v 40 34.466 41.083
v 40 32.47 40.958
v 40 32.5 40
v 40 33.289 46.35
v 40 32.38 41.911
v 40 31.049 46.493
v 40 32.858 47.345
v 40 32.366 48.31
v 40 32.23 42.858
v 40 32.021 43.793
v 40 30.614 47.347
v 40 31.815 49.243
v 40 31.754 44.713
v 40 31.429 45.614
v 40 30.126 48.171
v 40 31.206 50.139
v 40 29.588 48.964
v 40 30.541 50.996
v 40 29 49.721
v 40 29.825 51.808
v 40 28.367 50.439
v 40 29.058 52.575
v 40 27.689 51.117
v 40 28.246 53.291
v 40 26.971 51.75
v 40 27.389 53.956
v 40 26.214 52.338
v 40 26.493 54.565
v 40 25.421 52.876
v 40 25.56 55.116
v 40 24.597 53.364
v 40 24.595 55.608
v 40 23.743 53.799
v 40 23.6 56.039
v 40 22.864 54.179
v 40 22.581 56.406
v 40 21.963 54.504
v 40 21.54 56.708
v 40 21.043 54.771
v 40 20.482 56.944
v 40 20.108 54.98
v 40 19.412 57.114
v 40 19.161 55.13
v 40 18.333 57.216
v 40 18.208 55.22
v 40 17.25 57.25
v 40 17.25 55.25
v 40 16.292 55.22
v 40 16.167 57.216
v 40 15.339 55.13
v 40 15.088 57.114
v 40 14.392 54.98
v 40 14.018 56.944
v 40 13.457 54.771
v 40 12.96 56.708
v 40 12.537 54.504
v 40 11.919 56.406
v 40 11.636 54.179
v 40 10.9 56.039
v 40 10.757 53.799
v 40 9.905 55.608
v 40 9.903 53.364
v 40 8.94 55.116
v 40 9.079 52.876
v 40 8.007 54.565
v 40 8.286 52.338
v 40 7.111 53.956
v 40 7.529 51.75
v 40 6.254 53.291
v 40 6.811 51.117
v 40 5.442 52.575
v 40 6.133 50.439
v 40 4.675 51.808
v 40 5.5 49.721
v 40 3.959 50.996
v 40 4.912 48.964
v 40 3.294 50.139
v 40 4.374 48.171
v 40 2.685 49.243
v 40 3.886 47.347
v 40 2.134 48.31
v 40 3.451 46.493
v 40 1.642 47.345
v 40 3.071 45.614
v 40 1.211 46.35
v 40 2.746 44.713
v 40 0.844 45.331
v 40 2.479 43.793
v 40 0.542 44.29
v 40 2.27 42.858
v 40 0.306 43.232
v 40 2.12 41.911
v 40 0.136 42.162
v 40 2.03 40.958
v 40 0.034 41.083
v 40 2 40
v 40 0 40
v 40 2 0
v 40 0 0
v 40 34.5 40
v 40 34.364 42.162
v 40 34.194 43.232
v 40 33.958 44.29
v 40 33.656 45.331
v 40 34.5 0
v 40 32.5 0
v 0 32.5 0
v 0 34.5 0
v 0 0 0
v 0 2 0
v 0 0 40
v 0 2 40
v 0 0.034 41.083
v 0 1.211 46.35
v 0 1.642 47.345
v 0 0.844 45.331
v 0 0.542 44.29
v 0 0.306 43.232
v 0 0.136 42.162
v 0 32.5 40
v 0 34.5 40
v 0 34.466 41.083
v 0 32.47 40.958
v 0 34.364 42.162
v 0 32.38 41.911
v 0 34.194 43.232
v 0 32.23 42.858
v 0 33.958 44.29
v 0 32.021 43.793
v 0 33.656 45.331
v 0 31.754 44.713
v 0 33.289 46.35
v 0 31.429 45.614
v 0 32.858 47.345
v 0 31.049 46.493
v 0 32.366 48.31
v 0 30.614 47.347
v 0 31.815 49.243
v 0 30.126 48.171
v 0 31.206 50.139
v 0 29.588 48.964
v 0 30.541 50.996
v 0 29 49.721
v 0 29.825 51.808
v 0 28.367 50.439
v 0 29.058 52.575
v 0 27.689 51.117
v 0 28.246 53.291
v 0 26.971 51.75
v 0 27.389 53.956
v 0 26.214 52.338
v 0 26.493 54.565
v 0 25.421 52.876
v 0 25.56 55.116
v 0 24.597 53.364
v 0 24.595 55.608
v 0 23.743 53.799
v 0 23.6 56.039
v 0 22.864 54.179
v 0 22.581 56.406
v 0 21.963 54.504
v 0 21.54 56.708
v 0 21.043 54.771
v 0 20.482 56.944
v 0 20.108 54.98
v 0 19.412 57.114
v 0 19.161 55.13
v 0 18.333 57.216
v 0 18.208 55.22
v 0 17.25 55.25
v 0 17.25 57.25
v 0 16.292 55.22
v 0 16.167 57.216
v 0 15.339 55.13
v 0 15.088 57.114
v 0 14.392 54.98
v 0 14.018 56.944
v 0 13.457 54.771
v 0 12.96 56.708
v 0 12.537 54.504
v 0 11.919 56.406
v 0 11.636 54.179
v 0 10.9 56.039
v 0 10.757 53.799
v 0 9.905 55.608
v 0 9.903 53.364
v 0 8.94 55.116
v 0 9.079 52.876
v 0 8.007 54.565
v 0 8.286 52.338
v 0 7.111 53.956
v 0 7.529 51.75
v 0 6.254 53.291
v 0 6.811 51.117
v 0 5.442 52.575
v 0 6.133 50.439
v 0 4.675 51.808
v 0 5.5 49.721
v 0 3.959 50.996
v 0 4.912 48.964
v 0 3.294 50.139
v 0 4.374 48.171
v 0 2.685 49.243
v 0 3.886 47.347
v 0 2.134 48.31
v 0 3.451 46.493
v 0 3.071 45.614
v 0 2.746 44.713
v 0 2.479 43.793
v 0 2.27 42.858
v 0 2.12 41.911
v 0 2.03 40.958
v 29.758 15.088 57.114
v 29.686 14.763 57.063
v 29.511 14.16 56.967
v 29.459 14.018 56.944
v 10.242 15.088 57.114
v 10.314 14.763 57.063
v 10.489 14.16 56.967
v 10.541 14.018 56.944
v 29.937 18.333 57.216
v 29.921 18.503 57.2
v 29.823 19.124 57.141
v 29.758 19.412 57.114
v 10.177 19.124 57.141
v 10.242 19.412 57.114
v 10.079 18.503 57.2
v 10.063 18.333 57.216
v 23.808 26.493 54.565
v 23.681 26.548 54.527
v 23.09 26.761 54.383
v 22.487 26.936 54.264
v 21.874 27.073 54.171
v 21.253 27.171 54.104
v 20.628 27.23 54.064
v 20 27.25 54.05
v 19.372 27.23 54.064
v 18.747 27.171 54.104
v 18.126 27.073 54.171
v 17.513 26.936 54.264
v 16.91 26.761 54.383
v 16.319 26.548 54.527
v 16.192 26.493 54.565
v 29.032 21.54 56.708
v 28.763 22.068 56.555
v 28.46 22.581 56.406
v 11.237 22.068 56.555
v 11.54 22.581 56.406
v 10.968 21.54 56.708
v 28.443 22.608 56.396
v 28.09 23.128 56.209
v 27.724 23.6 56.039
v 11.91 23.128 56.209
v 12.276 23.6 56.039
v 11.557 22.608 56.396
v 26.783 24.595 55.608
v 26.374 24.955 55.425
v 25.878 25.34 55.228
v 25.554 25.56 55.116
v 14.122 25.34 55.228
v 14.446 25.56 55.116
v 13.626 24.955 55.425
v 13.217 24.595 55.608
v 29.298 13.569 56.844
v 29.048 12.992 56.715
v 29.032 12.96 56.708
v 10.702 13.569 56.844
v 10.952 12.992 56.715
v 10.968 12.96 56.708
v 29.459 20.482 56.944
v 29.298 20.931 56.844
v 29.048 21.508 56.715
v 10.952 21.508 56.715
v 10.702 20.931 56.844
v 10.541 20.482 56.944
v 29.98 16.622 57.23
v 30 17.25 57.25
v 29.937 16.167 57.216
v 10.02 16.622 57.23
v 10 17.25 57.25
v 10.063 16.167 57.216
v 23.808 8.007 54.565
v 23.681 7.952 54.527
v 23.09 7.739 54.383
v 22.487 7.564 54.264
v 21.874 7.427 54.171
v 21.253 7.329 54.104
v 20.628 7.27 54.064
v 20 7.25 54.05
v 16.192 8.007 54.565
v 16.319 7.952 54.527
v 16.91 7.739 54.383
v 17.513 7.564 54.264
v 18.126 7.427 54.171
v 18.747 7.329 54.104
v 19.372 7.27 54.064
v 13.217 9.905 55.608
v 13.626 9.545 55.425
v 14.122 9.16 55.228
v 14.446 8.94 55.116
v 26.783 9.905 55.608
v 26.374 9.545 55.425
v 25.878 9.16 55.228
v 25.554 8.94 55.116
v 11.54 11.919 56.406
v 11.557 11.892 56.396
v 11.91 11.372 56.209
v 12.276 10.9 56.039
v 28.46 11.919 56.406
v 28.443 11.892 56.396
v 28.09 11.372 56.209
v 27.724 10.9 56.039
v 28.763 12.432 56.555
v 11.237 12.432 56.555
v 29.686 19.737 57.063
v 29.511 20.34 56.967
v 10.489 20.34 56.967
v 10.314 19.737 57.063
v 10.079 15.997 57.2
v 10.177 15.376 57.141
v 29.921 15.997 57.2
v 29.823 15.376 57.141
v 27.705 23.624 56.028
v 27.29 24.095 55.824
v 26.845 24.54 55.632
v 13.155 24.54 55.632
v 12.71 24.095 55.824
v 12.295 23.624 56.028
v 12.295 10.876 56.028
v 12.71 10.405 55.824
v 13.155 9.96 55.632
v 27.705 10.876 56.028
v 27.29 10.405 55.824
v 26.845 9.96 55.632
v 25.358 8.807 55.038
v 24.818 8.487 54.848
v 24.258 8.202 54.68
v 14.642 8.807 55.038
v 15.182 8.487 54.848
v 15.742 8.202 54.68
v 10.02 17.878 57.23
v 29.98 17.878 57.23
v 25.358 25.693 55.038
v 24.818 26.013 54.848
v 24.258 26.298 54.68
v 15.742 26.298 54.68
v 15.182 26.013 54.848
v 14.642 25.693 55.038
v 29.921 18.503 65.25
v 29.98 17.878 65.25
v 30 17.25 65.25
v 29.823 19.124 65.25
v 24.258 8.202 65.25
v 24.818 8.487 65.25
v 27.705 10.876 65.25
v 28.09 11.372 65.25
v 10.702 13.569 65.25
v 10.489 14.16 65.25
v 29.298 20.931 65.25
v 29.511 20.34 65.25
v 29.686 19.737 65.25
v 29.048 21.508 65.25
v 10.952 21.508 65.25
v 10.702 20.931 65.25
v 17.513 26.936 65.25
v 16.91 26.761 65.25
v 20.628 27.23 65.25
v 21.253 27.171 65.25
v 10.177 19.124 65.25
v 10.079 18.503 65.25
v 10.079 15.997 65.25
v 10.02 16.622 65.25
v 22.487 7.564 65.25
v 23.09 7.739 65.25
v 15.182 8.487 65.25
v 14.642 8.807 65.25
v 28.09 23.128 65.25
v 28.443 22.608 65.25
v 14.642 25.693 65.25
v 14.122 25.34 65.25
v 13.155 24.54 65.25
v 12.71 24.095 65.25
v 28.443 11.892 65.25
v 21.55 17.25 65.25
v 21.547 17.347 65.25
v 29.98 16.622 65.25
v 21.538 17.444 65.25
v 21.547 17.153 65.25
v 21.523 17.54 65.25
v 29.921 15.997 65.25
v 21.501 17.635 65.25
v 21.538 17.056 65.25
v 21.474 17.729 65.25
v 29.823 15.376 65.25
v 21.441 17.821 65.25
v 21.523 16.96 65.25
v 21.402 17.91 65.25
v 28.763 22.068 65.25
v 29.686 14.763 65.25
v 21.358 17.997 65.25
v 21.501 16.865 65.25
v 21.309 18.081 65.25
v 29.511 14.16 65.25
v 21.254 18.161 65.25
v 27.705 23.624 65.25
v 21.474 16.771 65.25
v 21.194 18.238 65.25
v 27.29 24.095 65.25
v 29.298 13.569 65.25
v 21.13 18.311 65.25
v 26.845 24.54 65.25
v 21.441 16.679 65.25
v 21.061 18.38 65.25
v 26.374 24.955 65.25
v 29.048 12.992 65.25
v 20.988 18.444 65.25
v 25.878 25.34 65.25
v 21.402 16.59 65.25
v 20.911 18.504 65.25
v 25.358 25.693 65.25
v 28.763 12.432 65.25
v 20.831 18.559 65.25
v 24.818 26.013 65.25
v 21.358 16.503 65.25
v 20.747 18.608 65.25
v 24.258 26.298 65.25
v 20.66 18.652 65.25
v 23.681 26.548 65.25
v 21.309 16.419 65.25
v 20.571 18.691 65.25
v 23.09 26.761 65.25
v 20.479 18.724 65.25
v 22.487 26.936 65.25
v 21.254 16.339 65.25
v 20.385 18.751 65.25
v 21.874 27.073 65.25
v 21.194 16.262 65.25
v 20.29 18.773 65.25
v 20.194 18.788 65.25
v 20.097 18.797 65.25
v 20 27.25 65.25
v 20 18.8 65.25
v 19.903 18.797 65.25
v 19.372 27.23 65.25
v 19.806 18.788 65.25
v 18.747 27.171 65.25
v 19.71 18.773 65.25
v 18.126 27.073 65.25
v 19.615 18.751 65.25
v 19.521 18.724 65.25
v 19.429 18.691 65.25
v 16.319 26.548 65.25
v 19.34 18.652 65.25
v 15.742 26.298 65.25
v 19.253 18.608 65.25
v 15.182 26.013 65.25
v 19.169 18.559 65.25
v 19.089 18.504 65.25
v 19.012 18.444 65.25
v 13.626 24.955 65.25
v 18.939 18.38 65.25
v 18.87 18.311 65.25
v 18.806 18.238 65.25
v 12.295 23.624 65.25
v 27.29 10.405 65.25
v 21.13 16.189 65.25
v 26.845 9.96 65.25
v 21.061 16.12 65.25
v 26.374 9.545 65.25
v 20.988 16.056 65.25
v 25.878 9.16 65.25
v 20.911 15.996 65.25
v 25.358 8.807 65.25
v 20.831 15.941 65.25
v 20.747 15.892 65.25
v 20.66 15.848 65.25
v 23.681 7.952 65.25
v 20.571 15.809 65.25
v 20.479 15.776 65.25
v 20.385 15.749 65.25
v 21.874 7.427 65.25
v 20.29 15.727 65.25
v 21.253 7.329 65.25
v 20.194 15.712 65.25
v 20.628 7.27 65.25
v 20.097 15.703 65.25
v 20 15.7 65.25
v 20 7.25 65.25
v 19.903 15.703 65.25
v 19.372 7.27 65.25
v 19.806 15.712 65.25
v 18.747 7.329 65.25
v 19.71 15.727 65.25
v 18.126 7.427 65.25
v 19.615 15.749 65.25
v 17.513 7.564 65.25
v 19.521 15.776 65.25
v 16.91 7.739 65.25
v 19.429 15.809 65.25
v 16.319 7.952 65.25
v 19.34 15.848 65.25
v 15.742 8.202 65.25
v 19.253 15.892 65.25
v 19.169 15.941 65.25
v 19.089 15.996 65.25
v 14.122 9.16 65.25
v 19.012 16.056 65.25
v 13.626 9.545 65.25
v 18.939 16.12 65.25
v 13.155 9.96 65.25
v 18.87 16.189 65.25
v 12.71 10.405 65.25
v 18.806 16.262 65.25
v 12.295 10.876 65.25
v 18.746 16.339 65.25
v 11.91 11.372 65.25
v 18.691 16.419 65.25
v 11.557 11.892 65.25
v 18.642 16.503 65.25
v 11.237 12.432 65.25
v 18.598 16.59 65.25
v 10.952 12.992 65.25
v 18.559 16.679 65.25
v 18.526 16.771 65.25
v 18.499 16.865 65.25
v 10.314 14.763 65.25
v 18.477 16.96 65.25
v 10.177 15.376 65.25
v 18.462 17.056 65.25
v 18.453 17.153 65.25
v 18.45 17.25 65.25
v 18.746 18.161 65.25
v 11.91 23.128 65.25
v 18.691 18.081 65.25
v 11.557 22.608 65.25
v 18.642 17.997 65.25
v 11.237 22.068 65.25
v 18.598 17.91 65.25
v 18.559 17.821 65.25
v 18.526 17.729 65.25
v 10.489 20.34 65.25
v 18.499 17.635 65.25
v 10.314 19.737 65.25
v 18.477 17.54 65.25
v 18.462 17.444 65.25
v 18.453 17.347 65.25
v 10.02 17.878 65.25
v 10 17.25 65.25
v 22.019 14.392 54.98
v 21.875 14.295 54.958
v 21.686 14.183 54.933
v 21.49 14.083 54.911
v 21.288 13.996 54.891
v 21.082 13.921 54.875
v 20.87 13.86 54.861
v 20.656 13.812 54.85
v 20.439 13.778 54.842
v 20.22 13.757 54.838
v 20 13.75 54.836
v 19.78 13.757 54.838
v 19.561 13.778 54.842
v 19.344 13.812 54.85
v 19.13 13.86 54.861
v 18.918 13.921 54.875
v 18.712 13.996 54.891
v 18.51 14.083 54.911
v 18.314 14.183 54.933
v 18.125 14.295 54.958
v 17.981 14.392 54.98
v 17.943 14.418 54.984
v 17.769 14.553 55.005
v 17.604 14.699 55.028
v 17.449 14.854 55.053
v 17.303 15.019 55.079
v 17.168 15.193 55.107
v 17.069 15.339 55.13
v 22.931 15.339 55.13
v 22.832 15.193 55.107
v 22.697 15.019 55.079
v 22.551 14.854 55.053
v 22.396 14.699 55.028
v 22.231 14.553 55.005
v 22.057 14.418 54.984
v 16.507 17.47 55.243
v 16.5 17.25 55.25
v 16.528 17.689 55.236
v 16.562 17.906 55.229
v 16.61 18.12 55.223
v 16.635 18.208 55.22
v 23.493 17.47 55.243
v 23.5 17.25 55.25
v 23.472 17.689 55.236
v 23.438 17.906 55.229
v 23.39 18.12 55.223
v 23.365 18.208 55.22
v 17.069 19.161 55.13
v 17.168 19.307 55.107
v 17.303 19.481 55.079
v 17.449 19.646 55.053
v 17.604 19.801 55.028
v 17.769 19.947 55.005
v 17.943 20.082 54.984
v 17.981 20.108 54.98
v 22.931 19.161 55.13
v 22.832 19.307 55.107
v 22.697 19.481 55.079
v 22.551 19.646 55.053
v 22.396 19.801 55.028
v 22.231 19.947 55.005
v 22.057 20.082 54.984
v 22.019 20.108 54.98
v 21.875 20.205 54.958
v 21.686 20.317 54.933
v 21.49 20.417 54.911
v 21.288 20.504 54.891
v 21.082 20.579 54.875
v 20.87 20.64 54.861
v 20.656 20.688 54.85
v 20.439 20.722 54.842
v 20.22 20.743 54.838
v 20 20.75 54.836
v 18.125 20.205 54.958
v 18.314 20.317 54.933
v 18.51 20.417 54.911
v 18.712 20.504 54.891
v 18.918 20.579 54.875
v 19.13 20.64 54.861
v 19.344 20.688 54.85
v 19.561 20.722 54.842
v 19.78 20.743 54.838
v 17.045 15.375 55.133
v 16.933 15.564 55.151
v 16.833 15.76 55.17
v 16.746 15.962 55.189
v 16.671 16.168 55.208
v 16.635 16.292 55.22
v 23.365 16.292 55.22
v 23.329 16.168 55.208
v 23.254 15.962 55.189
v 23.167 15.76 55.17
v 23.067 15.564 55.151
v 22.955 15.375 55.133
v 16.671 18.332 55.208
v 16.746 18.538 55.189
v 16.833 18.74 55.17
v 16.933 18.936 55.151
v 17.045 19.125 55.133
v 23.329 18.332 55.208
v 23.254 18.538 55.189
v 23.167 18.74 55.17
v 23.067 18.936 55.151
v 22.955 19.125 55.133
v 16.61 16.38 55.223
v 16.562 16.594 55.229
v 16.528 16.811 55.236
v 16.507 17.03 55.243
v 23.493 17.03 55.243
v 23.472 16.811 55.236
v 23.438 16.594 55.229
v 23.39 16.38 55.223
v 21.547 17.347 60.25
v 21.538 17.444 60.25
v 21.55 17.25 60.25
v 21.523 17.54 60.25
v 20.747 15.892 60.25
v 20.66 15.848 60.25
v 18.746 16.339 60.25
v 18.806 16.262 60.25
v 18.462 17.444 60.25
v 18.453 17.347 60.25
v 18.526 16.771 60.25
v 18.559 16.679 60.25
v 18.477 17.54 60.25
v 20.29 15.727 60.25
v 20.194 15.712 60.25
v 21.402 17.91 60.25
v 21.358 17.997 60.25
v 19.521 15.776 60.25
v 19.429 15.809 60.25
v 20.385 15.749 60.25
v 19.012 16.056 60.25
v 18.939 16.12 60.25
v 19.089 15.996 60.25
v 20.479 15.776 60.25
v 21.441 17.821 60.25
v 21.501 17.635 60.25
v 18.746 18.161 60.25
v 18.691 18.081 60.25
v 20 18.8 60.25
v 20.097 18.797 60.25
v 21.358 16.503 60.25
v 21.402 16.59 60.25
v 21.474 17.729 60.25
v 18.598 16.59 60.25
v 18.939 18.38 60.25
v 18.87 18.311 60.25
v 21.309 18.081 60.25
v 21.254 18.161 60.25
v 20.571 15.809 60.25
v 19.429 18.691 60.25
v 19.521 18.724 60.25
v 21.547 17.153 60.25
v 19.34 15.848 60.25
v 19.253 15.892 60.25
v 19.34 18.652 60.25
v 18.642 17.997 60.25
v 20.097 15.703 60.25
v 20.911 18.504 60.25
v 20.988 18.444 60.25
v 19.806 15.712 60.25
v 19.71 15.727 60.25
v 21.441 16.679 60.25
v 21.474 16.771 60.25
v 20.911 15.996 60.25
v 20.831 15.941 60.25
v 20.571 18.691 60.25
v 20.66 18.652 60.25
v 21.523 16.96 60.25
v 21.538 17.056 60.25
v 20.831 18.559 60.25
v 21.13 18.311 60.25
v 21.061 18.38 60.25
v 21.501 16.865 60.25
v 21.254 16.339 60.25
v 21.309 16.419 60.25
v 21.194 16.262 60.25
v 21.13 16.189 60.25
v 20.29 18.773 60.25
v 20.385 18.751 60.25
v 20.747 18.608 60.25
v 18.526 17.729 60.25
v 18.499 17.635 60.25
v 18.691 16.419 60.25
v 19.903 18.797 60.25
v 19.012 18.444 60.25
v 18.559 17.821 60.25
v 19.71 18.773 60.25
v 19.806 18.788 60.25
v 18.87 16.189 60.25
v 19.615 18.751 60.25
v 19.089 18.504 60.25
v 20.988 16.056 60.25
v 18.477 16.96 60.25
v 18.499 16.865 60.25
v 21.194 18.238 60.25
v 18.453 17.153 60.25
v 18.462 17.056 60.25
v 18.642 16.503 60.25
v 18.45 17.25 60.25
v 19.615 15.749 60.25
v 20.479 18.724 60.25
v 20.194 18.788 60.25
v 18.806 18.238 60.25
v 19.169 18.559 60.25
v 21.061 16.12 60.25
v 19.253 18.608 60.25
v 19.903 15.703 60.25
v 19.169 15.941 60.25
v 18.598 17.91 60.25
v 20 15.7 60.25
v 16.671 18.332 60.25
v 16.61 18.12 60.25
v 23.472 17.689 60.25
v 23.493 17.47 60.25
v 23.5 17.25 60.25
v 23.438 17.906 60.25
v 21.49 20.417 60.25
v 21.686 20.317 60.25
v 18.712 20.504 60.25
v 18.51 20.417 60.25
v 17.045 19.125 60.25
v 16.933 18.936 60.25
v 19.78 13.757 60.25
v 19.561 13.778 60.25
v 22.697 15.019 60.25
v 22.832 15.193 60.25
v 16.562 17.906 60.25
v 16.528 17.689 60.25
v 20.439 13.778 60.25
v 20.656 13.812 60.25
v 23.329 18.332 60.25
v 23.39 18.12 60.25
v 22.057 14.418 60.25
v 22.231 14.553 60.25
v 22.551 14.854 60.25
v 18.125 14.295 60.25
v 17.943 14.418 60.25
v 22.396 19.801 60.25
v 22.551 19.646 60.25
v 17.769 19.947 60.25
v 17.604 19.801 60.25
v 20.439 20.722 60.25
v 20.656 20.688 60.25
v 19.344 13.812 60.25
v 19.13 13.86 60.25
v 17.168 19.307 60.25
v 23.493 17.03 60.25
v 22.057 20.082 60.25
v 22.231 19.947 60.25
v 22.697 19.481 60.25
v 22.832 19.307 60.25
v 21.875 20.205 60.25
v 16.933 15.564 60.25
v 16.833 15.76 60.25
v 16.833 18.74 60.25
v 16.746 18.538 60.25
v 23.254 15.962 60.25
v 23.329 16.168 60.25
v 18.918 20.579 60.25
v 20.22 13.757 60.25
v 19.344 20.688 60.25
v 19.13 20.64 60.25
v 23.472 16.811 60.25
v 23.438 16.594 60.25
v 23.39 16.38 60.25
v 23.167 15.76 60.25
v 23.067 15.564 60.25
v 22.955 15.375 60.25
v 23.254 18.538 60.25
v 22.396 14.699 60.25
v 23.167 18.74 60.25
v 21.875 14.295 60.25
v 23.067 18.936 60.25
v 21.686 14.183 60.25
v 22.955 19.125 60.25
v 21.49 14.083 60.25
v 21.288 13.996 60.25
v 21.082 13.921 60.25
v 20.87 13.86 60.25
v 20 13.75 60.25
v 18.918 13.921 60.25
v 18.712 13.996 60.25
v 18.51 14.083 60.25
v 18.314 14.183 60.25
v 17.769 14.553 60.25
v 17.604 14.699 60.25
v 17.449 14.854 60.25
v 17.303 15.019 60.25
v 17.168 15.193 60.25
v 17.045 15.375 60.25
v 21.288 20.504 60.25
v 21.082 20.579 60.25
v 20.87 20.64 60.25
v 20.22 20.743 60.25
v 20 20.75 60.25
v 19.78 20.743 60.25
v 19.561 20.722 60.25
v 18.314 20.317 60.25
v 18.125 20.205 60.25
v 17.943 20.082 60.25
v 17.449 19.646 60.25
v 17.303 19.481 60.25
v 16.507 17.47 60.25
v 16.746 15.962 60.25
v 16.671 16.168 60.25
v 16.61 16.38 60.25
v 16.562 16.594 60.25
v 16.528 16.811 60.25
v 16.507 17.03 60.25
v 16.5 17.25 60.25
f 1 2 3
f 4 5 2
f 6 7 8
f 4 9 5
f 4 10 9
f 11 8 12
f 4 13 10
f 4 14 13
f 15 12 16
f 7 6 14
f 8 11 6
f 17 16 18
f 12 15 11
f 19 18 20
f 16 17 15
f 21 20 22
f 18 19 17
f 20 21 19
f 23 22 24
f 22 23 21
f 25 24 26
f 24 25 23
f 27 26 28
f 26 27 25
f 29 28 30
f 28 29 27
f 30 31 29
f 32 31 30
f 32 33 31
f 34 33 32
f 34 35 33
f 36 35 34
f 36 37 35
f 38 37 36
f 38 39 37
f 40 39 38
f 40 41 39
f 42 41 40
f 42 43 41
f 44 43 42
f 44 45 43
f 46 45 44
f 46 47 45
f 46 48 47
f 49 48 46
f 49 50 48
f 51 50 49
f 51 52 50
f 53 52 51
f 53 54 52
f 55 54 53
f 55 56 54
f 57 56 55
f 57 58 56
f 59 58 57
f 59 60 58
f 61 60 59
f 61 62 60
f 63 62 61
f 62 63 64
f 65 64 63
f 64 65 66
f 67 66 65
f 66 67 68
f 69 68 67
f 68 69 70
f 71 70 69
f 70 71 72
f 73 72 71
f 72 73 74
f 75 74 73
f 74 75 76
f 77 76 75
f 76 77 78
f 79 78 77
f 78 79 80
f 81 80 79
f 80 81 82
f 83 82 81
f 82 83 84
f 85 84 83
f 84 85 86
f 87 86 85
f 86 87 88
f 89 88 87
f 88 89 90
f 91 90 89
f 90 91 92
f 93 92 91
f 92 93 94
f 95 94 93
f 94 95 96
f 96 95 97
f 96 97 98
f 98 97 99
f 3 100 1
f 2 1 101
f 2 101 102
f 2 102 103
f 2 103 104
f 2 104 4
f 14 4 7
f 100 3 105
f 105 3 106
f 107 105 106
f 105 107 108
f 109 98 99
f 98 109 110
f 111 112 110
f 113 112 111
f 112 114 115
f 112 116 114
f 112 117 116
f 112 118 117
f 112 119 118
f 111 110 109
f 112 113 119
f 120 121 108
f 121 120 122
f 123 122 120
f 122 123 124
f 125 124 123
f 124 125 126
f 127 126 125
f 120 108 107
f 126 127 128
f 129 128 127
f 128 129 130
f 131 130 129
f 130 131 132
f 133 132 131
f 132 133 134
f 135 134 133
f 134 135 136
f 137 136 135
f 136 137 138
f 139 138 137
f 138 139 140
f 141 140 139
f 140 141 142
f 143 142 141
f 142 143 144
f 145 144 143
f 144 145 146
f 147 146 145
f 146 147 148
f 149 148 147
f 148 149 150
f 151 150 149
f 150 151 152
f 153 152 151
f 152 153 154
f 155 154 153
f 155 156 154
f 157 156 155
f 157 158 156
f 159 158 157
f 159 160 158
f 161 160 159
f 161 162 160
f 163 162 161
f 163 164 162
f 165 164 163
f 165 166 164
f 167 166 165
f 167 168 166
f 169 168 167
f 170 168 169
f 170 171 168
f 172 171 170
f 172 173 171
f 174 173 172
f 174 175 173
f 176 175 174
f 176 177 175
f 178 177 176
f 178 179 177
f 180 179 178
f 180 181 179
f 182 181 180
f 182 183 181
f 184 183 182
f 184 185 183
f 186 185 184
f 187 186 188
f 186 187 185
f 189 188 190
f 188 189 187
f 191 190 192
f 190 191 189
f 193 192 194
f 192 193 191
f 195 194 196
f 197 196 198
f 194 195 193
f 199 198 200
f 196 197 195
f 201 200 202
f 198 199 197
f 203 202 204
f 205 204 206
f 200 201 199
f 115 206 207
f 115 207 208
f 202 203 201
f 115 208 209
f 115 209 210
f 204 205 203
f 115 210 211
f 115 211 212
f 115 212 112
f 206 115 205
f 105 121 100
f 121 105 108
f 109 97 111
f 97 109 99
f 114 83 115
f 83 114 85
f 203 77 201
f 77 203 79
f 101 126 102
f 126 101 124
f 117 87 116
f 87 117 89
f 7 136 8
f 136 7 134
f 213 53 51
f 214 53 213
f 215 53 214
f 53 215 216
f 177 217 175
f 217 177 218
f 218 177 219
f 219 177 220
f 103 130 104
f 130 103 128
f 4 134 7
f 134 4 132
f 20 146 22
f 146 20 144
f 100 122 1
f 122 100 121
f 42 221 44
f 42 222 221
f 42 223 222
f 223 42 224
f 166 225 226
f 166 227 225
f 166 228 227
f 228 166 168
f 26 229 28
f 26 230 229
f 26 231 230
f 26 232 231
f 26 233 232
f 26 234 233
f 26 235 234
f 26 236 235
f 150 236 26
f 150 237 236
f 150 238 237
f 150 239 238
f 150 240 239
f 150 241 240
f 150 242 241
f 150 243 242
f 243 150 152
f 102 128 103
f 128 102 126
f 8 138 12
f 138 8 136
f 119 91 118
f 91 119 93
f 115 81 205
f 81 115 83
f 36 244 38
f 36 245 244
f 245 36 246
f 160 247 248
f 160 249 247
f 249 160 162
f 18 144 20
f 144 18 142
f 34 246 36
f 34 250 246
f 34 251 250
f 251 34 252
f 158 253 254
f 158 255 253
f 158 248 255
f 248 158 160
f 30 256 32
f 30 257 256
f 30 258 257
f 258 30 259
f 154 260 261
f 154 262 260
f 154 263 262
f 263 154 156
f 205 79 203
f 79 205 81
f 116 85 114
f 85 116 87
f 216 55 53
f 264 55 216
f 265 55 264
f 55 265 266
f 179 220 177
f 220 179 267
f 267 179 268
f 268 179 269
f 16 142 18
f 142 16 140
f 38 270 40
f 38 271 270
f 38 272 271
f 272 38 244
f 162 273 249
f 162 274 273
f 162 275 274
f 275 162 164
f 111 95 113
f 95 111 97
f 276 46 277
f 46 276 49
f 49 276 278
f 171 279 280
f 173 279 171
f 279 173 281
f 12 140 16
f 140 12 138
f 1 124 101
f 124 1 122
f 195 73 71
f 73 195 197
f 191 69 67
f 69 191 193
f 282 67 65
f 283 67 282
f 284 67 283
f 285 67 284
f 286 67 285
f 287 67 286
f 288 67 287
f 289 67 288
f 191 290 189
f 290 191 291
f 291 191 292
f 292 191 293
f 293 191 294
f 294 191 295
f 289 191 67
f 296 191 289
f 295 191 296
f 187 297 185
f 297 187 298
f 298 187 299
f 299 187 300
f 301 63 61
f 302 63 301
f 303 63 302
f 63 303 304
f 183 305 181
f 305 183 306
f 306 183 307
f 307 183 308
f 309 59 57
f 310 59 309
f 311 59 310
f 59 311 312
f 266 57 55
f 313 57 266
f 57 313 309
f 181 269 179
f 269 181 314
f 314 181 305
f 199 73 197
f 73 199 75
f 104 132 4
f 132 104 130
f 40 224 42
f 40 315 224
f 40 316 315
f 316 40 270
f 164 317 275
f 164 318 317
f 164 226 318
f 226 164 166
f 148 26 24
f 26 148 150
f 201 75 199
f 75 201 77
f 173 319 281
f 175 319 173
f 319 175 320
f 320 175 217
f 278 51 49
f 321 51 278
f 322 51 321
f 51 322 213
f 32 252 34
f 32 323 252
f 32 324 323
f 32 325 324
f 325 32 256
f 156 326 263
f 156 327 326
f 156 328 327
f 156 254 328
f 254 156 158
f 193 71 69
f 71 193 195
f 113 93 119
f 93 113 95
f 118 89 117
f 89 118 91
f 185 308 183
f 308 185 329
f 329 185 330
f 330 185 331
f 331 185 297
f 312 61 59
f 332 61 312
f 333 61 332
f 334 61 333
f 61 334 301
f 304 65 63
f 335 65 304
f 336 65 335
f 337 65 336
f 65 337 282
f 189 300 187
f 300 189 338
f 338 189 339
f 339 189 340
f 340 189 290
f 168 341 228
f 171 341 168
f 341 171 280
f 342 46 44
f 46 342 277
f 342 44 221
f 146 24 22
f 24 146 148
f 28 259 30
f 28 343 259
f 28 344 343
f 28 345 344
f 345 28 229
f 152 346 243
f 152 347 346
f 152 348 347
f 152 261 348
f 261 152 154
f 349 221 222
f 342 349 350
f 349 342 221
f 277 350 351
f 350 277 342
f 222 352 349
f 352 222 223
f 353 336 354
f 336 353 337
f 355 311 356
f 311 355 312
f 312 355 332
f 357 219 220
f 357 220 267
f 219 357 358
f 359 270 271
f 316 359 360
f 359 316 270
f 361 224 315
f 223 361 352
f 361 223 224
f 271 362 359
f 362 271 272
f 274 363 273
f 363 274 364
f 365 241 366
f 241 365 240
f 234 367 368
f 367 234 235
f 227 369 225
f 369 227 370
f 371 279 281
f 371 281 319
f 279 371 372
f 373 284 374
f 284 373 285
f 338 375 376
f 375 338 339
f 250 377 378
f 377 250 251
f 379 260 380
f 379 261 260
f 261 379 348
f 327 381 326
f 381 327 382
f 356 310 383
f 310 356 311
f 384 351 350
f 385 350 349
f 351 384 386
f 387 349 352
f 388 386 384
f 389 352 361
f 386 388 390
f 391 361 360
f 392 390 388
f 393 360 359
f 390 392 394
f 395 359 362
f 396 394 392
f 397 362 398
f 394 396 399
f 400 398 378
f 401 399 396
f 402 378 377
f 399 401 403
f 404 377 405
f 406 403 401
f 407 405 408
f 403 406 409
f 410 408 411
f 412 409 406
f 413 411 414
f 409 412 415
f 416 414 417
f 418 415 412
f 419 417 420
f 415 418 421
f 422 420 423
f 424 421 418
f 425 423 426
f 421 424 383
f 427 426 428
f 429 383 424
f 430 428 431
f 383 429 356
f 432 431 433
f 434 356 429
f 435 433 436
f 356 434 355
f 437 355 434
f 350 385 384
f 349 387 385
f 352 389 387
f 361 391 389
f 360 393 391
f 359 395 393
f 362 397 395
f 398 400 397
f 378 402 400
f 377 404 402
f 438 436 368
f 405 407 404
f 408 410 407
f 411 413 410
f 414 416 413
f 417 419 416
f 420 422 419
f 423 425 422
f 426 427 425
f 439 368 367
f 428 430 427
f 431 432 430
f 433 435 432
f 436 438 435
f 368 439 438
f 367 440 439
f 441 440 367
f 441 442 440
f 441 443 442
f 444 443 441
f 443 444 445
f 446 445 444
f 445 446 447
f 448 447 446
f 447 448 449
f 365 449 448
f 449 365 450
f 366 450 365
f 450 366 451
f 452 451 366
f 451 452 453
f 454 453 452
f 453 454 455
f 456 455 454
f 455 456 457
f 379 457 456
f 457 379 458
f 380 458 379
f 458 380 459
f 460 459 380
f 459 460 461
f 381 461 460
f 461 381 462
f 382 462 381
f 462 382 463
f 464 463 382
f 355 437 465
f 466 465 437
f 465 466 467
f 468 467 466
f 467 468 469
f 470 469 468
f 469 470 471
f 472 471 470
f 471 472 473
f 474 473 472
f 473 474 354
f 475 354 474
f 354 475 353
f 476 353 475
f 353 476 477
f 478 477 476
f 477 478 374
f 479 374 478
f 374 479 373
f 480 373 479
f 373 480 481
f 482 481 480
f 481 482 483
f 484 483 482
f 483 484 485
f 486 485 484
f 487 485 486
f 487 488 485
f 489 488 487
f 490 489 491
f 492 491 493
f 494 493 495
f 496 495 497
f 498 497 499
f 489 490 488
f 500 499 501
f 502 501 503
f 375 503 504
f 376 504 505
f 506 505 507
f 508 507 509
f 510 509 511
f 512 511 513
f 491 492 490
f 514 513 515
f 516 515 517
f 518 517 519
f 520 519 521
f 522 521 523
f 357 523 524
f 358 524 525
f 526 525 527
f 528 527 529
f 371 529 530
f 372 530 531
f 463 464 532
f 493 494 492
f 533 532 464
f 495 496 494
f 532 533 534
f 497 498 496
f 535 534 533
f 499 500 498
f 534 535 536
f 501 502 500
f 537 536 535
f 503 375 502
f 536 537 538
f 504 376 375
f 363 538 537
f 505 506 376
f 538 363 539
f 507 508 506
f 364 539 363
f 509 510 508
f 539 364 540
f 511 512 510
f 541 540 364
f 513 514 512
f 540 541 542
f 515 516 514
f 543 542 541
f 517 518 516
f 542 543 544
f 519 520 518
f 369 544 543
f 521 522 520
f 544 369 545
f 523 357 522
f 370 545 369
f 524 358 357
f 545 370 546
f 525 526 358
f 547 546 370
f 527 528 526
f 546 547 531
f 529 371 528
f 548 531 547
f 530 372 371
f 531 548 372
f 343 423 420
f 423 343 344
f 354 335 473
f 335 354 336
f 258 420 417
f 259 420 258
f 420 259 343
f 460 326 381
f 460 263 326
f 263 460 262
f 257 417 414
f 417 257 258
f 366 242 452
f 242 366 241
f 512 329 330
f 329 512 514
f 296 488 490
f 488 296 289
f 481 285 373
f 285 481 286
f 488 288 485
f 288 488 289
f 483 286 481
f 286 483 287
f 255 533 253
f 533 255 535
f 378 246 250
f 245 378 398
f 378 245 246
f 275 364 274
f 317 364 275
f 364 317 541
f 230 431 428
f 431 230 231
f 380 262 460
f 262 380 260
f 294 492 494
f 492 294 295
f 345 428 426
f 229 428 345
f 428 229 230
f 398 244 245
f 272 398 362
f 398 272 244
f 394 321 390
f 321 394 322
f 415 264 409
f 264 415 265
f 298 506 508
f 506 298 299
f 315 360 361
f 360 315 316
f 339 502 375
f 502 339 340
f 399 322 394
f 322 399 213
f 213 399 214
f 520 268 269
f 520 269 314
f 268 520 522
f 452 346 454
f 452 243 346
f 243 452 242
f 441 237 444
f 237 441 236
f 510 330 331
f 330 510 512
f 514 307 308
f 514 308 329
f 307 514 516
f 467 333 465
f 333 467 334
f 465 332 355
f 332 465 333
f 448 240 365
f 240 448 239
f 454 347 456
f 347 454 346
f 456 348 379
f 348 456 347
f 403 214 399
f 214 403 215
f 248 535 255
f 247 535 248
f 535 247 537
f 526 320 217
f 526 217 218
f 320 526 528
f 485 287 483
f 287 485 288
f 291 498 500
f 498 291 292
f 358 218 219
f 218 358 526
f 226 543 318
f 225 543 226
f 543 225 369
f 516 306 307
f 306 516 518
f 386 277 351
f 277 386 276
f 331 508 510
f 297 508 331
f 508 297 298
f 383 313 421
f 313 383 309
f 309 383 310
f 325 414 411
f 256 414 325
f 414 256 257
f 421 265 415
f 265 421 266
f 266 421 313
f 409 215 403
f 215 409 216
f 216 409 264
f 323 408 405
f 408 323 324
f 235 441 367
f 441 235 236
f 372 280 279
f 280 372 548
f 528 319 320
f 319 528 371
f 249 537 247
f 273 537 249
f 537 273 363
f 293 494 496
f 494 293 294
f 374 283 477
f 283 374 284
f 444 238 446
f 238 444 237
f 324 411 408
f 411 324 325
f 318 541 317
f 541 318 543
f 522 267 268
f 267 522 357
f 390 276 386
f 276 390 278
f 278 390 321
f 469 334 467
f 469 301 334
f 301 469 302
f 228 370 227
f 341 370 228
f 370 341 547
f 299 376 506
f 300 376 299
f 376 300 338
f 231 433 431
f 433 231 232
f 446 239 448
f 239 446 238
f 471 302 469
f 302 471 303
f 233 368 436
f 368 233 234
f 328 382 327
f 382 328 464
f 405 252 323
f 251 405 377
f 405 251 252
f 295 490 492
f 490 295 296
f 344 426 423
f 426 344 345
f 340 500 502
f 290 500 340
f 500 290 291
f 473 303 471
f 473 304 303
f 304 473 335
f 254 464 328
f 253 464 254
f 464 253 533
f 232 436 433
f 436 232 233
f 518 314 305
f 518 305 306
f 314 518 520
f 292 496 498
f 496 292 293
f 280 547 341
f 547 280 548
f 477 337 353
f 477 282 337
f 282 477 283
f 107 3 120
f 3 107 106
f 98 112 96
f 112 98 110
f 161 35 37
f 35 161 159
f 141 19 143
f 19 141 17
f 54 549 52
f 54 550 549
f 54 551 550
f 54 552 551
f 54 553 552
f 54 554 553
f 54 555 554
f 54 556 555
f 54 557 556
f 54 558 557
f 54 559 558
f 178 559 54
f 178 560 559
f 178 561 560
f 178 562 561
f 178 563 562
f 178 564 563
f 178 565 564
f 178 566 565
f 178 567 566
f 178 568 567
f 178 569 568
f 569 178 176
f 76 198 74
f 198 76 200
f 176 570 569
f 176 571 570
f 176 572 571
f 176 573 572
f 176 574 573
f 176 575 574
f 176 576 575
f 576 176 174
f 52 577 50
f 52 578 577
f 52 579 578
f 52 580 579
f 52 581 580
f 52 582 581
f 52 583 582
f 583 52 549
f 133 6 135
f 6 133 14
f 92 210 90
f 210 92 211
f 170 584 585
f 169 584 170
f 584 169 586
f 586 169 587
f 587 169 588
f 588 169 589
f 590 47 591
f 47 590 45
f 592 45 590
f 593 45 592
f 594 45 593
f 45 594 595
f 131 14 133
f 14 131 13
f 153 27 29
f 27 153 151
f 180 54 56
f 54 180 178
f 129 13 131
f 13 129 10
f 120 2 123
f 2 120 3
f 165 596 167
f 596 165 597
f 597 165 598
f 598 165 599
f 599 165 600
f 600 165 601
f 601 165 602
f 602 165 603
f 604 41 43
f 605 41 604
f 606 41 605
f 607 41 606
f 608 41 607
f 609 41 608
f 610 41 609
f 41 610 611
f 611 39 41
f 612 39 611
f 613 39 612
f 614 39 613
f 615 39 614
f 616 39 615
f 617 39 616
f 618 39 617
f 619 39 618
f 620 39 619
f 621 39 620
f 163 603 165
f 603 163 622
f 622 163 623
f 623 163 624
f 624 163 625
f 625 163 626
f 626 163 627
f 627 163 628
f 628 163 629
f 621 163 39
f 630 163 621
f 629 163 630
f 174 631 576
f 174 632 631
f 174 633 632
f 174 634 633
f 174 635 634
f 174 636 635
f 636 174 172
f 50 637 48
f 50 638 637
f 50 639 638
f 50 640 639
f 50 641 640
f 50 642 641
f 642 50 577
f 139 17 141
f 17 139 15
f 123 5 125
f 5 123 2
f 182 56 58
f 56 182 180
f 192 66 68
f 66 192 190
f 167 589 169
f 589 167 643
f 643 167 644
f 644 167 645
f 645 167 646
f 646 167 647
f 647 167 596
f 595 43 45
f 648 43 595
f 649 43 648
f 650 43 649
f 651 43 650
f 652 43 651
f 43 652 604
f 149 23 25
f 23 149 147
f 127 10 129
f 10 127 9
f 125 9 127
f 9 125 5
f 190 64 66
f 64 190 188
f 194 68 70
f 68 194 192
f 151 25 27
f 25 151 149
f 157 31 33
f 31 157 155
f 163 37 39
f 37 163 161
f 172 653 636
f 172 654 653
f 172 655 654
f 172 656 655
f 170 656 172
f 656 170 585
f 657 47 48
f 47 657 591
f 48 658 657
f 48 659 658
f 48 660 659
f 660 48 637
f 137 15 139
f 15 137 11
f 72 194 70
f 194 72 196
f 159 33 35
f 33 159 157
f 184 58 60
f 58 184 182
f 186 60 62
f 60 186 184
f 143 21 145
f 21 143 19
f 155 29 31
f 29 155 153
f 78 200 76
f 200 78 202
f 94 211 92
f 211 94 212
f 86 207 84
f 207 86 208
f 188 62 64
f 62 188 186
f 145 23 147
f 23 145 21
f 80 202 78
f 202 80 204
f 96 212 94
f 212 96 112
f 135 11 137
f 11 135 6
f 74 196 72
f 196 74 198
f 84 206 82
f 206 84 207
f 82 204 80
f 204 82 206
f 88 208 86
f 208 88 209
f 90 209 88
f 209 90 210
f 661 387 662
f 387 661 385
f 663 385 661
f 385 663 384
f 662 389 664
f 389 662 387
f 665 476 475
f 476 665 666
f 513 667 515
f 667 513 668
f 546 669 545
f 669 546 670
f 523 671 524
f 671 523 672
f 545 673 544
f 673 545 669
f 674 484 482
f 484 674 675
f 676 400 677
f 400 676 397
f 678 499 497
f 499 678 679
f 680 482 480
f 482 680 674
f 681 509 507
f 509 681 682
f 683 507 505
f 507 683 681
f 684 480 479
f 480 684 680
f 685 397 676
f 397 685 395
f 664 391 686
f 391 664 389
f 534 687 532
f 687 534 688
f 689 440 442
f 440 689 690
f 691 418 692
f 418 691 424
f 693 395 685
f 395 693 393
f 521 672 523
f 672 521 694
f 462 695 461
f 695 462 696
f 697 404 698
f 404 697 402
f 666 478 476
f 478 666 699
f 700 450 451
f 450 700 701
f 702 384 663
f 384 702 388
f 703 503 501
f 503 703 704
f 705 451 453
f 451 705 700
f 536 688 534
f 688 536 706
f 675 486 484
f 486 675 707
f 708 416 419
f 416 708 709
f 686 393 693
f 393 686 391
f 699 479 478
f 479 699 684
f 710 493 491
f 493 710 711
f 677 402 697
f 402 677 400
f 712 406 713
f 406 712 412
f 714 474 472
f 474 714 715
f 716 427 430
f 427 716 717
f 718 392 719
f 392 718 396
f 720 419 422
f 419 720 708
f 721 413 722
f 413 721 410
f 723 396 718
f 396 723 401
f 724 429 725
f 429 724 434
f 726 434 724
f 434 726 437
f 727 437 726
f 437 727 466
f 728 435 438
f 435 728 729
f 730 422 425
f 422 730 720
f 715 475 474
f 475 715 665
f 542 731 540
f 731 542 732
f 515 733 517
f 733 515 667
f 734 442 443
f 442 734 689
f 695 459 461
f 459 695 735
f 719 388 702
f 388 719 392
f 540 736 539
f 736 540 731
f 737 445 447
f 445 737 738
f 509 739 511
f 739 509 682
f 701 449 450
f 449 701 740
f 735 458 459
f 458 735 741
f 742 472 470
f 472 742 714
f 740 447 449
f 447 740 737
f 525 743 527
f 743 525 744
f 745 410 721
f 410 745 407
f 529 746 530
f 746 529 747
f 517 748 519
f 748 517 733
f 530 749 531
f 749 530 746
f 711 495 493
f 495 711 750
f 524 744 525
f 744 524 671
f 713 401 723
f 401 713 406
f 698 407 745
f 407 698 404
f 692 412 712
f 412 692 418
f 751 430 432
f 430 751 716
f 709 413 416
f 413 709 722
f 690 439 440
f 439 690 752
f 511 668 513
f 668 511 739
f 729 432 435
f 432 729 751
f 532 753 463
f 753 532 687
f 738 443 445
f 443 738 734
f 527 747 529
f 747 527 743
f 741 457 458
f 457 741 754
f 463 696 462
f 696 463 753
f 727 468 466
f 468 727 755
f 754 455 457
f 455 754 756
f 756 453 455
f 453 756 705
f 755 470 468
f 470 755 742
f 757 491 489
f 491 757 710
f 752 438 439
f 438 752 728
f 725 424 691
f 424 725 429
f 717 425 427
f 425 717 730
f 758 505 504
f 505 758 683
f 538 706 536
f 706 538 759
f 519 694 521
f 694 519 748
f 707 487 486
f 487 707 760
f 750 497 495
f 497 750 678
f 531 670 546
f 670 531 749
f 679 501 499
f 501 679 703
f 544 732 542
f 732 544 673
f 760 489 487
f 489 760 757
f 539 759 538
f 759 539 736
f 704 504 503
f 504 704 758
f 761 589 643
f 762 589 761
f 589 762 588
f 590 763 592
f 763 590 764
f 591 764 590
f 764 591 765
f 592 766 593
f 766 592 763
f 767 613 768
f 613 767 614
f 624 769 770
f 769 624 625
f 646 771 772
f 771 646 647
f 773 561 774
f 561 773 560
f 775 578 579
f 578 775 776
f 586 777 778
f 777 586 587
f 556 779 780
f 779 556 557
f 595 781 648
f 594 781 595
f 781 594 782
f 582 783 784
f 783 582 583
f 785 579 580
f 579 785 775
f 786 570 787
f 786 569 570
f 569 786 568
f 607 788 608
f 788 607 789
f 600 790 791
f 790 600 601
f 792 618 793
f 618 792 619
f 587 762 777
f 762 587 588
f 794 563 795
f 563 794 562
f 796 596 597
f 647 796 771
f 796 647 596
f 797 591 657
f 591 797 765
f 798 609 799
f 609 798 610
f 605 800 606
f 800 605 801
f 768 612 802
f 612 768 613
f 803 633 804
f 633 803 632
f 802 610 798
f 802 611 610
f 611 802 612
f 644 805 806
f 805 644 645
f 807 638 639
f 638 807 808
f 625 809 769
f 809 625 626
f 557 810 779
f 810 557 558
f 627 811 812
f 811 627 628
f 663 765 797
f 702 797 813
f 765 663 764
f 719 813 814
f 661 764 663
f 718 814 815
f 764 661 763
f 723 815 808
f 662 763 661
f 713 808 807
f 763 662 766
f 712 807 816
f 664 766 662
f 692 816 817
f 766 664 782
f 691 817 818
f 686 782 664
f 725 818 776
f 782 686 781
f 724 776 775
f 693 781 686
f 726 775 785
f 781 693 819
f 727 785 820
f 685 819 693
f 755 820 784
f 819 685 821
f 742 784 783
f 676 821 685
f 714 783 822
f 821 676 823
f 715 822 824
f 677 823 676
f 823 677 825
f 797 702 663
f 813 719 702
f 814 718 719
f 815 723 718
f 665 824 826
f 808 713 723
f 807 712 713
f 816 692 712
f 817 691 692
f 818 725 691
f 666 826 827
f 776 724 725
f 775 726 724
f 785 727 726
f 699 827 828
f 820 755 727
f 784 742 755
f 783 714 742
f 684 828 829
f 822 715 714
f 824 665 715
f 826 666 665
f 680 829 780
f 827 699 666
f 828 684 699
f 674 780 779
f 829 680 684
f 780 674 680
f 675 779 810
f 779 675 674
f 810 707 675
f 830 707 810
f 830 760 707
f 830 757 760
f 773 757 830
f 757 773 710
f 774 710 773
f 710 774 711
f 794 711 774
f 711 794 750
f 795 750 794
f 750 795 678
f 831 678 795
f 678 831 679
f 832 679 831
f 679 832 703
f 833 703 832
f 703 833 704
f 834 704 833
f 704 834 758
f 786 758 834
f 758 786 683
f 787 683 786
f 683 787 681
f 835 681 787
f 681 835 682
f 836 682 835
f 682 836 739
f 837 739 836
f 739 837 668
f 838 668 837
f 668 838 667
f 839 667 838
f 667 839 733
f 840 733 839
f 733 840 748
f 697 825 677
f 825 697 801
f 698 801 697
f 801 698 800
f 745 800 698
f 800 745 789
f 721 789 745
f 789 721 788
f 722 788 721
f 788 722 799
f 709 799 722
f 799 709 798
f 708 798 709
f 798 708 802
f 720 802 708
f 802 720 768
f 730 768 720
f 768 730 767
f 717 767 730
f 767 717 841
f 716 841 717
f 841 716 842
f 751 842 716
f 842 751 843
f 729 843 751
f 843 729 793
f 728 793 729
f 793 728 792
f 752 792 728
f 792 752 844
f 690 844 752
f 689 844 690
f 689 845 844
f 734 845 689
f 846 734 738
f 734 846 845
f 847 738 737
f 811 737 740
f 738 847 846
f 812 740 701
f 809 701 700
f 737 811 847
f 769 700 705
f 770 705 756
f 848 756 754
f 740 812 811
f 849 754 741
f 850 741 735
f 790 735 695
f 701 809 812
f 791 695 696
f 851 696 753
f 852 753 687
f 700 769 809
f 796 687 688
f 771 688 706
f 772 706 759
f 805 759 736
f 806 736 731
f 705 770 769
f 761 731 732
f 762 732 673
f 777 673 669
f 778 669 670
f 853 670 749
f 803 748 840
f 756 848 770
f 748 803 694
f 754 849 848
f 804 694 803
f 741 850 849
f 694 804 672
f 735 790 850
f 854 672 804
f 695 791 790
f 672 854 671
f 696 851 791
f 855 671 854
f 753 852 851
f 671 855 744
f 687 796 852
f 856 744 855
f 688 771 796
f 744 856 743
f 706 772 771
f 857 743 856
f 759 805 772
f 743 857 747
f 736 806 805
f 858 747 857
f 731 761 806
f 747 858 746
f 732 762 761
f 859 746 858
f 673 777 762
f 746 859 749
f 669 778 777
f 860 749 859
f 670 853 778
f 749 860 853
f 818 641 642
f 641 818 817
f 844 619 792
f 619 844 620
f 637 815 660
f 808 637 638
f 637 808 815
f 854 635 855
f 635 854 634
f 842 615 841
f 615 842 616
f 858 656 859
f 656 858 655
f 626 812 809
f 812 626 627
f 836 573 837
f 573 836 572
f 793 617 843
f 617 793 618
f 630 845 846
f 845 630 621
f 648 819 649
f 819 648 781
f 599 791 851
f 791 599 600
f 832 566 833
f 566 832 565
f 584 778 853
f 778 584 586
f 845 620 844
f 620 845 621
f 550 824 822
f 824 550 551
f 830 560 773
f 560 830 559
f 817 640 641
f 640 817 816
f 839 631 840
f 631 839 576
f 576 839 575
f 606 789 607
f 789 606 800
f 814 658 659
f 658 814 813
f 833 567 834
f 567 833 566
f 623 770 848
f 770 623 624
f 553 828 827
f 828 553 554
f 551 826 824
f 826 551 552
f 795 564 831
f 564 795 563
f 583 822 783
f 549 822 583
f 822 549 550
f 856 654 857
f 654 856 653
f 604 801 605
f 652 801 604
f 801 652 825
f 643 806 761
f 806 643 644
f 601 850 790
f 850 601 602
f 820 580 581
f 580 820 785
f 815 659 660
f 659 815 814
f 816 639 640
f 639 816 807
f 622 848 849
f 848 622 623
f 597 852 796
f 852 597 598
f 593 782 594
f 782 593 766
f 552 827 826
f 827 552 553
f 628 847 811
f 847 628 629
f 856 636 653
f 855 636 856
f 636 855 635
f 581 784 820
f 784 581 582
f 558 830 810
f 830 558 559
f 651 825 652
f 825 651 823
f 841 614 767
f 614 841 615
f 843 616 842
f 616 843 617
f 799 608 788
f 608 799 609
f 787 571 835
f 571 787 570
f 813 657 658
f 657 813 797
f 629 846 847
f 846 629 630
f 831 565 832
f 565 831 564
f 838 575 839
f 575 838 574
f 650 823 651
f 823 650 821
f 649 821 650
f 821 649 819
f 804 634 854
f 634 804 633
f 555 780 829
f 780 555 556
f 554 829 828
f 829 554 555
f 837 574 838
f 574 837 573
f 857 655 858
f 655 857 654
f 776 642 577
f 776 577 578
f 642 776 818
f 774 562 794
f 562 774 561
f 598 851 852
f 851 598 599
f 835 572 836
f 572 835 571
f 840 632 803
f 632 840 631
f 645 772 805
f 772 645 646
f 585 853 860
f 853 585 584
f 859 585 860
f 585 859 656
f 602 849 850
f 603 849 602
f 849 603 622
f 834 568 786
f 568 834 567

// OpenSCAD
$fn = 100;

mount_size = 30.4 + 0.1;

width = 40;
thick = 2;
deep = 40;

m3_thread = 3.1;
m3_thread_len = 5;
m3_head = 7;
m3_head_len = 3;
m3_ext = 20;

bed_mount();

module bed_mount()
{
    difference()
    {
        union()
        {
            cube([width, thick + mount_size + thick, deep]);
            translate([0,mount_size/2 + thick, deep])rotate([0,90,0]) cylinder (r = mount_size / 2 + thick, h = width);
            translate([width/2,thick + mount_size/2,0]) cylinder( r = m3_ext / 2, h = deep + mount_size/2 + thick + m3_head_len + m3_thread_len);
        }
        union()
        {
            translate([-1, thick, -1]) cube([width + 2, mount_size, deep+1]);
            translate([-1,mount_size/2 + thick, deep])rotate([0,90,0]) cylinder (r = mount_size / 2, h = width + 2);
            translate([width/2,thick + mount_size/2,-1]) cylinder( r = m3_thread / 2, h = deep + mount_size/2 + thick + m3_head_len + m3_thread_len + 2);
            translate([width/2,thick + mount_size/2,-1]) cylinder( r = m3_head / 2, h = deep + mount_size/2 + thick + m3_head_len + 1);
        }
    }
}
